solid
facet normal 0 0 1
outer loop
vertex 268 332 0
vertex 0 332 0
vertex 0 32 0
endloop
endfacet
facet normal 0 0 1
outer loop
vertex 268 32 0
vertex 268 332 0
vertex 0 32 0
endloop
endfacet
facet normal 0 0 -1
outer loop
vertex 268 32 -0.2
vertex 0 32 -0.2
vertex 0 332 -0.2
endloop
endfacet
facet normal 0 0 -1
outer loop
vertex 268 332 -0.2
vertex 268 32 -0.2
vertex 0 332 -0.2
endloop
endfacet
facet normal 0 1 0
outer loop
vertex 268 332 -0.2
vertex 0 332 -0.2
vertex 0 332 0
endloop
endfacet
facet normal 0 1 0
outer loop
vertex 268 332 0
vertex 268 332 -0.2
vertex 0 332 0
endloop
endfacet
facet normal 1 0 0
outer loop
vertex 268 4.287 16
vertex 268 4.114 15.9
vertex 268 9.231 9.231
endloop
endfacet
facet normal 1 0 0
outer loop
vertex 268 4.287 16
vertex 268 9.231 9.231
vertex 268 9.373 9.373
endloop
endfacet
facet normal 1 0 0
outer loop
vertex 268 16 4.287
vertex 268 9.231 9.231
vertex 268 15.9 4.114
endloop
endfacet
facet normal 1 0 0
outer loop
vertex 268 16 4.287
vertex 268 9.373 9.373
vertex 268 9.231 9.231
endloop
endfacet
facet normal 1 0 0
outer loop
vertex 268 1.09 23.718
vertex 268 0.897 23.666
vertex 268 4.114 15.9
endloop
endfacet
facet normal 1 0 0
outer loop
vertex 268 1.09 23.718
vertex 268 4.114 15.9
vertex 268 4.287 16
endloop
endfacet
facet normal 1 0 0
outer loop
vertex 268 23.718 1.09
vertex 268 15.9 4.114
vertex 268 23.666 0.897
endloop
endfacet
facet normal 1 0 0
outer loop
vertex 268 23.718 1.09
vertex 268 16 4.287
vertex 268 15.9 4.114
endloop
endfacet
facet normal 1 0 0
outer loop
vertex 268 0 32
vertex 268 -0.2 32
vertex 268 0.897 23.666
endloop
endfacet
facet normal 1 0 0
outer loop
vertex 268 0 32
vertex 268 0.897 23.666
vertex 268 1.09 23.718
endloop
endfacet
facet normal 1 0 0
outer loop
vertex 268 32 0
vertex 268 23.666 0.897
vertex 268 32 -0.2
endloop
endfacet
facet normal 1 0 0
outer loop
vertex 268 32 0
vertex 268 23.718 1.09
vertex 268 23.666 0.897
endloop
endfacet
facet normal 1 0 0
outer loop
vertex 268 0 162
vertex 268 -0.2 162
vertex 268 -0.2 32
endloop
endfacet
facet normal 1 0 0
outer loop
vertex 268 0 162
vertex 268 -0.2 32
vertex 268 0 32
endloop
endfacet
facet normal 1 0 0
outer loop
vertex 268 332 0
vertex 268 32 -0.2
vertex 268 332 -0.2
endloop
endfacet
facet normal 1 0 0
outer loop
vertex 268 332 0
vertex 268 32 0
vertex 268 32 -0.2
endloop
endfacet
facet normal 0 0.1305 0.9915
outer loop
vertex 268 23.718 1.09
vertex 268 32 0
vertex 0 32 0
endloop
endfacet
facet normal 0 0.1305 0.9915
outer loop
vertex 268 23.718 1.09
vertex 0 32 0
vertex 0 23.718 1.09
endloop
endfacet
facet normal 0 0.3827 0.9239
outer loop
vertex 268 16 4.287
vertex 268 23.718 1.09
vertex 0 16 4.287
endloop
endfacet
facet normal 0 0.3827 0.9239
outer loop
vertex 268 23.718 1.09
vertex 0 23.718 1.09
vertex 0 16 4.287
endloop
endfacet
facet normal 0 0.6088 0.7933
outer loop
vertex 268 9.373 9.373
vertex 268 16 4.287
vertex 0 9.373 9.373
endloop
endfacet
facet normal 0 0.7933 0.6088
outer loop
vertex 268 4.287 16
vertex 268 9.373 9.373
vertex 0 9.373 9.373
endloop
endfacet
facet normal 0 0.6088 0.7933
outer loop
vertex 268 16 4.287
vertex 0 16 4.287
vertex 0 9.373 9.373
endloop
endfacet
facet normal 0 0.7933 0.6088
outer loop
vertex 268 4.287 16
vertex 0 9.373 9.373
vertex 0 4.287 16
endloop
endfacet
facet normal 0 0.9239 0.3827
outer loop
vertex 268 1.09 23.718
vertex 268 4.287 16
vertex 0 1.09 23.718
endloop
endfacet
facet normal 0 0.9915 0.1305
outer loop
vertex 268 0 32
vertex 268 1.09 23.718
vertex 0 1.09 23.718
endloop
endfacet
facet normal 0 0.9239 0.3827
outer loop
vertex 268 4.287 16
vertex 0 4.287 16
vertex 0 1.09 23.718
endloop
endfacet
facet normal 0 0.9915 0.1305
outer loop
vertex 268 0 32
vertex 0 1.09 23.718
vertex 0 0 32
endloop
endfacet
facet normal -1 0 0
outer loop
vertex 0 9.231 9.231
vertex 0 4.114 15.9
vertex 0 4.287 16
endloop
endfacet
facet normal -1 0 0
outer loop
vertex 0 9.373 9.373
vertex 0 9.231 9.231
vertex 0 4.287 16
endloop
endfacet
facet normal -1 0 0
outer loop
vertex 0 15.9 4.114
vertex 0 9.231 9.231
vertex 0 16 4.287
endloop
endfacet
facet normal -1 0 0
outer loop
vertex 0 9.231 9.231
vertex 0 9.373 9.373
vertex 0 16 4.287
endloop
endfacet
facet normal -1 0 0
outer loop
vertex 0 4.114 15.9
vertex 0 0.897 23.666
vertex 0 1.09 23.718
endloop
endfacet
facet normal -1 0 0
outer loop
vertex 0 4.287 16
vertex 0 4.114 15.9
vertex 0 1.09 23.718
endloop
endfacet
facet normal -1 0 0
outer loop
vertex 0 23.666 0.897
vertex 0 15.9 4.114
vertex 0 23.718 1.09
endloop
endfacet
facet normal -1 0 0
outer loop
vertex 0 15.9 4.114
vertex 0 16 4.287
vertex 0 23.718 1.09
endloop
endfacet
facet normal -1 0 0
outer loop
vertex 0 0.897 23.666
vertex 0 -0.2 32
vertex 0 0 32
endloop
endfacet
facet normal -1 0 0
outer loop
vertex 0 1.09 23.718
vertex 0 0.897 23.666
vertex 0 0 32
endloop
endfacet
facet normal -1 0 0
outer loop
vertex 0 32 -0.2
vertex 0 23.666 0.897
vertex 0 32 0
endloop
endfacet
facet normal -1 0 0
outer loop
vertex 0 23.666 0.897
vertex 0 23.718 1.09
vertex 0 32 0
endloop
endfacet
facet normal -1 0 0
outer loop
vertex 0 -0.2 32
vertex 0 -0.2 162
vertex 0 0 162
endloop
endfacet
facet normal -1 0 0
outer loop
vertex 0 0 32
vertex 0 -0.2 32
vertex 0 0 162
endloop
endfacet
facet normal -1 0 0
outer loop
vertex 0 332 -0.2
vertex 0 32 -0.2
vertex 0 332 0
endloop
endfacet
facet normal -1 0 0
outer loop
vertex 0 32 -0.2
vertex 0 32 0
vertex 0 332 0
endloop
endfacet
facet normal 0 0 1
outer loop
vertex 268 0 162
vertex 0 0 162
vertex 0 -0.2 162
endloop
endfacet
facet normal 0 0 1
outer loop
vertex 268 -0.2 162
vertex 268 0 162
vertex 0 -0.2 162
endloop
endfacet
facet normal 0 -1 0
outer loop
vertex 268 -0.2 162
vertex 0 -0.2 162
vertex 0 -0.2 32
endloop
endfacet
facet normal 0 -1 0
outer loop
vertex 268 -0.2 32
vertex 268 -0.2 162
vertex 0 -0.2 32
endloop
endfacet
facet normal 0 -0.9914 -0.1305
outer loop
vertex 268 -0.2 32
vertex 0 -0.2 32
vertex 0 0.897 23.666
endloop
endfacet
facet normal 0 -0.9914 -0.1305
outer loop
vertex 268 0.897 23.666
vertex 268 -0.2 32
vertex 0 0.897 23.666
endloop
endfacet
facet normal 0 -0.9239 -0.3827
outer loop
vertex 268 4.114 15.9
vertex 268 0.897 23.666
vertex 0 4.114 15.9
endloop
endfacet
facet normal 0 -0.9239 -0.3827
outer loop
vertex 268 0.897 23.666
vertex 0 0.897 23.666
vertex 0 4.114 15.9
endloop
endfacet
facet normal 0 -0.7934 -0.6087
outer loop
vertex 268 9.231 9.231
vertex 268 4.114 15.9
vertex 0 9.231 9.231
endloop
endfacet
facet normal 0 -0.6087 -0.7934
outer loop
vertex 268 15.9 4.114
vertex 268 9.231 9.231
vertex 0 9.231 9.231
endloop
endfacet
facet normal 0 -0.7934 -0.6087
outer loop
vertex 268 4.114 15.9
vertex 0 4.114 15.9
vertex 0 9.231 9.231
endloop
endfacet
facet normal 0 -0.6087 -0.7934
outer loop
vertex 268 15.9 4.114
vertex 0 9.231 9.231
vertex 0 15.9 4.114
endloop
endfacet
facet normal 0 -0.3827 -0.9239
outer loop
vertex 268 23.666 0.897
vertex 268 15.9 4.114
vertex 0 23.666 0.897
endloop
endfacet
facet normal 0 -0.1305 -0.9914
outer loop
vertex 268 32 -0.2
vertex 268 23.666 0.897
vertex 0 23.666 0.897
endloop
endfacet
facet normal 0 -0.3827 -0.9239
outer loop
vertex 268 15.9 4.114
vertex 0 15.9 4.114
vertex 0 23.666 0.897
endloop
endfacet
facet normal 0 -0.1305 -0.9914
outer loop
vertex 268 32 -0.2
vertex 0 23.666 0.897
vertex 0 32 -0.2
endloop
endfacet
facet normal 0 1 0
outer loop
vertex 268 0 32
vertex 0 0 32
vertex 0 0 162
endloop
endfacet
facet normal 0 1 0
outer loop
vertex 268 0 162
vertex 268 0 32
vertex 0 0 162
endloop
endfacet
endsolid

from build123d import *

# Parameters (mm, degrees)
F1_DEPTH = 268


with BuildPart() as f1:
    # F0 (on Right) → F1 (new body)
    with BuildSketch(Plane.YZ):
        with BuildLine():
            ThreePointArc((32, 0), (9.372583, 9.372583), (0, 32))
            Line((0, 32), (0, 162))
            Line((0, 162), (-0.2, 162))
            Line((-0.2, 162), (-0.2, 32))
            ThreePointArc((-0.2, 32), (9.231162, 9.231162), (32, -0.2))
            Line((32, -0.2), (332, -0.2))
            Line((332, -0.2), (332, 0))
            Line((332, 0), (32, 0))
        make_face()
    extrude(amount=F1_DEPTH)


solid = f1.part
